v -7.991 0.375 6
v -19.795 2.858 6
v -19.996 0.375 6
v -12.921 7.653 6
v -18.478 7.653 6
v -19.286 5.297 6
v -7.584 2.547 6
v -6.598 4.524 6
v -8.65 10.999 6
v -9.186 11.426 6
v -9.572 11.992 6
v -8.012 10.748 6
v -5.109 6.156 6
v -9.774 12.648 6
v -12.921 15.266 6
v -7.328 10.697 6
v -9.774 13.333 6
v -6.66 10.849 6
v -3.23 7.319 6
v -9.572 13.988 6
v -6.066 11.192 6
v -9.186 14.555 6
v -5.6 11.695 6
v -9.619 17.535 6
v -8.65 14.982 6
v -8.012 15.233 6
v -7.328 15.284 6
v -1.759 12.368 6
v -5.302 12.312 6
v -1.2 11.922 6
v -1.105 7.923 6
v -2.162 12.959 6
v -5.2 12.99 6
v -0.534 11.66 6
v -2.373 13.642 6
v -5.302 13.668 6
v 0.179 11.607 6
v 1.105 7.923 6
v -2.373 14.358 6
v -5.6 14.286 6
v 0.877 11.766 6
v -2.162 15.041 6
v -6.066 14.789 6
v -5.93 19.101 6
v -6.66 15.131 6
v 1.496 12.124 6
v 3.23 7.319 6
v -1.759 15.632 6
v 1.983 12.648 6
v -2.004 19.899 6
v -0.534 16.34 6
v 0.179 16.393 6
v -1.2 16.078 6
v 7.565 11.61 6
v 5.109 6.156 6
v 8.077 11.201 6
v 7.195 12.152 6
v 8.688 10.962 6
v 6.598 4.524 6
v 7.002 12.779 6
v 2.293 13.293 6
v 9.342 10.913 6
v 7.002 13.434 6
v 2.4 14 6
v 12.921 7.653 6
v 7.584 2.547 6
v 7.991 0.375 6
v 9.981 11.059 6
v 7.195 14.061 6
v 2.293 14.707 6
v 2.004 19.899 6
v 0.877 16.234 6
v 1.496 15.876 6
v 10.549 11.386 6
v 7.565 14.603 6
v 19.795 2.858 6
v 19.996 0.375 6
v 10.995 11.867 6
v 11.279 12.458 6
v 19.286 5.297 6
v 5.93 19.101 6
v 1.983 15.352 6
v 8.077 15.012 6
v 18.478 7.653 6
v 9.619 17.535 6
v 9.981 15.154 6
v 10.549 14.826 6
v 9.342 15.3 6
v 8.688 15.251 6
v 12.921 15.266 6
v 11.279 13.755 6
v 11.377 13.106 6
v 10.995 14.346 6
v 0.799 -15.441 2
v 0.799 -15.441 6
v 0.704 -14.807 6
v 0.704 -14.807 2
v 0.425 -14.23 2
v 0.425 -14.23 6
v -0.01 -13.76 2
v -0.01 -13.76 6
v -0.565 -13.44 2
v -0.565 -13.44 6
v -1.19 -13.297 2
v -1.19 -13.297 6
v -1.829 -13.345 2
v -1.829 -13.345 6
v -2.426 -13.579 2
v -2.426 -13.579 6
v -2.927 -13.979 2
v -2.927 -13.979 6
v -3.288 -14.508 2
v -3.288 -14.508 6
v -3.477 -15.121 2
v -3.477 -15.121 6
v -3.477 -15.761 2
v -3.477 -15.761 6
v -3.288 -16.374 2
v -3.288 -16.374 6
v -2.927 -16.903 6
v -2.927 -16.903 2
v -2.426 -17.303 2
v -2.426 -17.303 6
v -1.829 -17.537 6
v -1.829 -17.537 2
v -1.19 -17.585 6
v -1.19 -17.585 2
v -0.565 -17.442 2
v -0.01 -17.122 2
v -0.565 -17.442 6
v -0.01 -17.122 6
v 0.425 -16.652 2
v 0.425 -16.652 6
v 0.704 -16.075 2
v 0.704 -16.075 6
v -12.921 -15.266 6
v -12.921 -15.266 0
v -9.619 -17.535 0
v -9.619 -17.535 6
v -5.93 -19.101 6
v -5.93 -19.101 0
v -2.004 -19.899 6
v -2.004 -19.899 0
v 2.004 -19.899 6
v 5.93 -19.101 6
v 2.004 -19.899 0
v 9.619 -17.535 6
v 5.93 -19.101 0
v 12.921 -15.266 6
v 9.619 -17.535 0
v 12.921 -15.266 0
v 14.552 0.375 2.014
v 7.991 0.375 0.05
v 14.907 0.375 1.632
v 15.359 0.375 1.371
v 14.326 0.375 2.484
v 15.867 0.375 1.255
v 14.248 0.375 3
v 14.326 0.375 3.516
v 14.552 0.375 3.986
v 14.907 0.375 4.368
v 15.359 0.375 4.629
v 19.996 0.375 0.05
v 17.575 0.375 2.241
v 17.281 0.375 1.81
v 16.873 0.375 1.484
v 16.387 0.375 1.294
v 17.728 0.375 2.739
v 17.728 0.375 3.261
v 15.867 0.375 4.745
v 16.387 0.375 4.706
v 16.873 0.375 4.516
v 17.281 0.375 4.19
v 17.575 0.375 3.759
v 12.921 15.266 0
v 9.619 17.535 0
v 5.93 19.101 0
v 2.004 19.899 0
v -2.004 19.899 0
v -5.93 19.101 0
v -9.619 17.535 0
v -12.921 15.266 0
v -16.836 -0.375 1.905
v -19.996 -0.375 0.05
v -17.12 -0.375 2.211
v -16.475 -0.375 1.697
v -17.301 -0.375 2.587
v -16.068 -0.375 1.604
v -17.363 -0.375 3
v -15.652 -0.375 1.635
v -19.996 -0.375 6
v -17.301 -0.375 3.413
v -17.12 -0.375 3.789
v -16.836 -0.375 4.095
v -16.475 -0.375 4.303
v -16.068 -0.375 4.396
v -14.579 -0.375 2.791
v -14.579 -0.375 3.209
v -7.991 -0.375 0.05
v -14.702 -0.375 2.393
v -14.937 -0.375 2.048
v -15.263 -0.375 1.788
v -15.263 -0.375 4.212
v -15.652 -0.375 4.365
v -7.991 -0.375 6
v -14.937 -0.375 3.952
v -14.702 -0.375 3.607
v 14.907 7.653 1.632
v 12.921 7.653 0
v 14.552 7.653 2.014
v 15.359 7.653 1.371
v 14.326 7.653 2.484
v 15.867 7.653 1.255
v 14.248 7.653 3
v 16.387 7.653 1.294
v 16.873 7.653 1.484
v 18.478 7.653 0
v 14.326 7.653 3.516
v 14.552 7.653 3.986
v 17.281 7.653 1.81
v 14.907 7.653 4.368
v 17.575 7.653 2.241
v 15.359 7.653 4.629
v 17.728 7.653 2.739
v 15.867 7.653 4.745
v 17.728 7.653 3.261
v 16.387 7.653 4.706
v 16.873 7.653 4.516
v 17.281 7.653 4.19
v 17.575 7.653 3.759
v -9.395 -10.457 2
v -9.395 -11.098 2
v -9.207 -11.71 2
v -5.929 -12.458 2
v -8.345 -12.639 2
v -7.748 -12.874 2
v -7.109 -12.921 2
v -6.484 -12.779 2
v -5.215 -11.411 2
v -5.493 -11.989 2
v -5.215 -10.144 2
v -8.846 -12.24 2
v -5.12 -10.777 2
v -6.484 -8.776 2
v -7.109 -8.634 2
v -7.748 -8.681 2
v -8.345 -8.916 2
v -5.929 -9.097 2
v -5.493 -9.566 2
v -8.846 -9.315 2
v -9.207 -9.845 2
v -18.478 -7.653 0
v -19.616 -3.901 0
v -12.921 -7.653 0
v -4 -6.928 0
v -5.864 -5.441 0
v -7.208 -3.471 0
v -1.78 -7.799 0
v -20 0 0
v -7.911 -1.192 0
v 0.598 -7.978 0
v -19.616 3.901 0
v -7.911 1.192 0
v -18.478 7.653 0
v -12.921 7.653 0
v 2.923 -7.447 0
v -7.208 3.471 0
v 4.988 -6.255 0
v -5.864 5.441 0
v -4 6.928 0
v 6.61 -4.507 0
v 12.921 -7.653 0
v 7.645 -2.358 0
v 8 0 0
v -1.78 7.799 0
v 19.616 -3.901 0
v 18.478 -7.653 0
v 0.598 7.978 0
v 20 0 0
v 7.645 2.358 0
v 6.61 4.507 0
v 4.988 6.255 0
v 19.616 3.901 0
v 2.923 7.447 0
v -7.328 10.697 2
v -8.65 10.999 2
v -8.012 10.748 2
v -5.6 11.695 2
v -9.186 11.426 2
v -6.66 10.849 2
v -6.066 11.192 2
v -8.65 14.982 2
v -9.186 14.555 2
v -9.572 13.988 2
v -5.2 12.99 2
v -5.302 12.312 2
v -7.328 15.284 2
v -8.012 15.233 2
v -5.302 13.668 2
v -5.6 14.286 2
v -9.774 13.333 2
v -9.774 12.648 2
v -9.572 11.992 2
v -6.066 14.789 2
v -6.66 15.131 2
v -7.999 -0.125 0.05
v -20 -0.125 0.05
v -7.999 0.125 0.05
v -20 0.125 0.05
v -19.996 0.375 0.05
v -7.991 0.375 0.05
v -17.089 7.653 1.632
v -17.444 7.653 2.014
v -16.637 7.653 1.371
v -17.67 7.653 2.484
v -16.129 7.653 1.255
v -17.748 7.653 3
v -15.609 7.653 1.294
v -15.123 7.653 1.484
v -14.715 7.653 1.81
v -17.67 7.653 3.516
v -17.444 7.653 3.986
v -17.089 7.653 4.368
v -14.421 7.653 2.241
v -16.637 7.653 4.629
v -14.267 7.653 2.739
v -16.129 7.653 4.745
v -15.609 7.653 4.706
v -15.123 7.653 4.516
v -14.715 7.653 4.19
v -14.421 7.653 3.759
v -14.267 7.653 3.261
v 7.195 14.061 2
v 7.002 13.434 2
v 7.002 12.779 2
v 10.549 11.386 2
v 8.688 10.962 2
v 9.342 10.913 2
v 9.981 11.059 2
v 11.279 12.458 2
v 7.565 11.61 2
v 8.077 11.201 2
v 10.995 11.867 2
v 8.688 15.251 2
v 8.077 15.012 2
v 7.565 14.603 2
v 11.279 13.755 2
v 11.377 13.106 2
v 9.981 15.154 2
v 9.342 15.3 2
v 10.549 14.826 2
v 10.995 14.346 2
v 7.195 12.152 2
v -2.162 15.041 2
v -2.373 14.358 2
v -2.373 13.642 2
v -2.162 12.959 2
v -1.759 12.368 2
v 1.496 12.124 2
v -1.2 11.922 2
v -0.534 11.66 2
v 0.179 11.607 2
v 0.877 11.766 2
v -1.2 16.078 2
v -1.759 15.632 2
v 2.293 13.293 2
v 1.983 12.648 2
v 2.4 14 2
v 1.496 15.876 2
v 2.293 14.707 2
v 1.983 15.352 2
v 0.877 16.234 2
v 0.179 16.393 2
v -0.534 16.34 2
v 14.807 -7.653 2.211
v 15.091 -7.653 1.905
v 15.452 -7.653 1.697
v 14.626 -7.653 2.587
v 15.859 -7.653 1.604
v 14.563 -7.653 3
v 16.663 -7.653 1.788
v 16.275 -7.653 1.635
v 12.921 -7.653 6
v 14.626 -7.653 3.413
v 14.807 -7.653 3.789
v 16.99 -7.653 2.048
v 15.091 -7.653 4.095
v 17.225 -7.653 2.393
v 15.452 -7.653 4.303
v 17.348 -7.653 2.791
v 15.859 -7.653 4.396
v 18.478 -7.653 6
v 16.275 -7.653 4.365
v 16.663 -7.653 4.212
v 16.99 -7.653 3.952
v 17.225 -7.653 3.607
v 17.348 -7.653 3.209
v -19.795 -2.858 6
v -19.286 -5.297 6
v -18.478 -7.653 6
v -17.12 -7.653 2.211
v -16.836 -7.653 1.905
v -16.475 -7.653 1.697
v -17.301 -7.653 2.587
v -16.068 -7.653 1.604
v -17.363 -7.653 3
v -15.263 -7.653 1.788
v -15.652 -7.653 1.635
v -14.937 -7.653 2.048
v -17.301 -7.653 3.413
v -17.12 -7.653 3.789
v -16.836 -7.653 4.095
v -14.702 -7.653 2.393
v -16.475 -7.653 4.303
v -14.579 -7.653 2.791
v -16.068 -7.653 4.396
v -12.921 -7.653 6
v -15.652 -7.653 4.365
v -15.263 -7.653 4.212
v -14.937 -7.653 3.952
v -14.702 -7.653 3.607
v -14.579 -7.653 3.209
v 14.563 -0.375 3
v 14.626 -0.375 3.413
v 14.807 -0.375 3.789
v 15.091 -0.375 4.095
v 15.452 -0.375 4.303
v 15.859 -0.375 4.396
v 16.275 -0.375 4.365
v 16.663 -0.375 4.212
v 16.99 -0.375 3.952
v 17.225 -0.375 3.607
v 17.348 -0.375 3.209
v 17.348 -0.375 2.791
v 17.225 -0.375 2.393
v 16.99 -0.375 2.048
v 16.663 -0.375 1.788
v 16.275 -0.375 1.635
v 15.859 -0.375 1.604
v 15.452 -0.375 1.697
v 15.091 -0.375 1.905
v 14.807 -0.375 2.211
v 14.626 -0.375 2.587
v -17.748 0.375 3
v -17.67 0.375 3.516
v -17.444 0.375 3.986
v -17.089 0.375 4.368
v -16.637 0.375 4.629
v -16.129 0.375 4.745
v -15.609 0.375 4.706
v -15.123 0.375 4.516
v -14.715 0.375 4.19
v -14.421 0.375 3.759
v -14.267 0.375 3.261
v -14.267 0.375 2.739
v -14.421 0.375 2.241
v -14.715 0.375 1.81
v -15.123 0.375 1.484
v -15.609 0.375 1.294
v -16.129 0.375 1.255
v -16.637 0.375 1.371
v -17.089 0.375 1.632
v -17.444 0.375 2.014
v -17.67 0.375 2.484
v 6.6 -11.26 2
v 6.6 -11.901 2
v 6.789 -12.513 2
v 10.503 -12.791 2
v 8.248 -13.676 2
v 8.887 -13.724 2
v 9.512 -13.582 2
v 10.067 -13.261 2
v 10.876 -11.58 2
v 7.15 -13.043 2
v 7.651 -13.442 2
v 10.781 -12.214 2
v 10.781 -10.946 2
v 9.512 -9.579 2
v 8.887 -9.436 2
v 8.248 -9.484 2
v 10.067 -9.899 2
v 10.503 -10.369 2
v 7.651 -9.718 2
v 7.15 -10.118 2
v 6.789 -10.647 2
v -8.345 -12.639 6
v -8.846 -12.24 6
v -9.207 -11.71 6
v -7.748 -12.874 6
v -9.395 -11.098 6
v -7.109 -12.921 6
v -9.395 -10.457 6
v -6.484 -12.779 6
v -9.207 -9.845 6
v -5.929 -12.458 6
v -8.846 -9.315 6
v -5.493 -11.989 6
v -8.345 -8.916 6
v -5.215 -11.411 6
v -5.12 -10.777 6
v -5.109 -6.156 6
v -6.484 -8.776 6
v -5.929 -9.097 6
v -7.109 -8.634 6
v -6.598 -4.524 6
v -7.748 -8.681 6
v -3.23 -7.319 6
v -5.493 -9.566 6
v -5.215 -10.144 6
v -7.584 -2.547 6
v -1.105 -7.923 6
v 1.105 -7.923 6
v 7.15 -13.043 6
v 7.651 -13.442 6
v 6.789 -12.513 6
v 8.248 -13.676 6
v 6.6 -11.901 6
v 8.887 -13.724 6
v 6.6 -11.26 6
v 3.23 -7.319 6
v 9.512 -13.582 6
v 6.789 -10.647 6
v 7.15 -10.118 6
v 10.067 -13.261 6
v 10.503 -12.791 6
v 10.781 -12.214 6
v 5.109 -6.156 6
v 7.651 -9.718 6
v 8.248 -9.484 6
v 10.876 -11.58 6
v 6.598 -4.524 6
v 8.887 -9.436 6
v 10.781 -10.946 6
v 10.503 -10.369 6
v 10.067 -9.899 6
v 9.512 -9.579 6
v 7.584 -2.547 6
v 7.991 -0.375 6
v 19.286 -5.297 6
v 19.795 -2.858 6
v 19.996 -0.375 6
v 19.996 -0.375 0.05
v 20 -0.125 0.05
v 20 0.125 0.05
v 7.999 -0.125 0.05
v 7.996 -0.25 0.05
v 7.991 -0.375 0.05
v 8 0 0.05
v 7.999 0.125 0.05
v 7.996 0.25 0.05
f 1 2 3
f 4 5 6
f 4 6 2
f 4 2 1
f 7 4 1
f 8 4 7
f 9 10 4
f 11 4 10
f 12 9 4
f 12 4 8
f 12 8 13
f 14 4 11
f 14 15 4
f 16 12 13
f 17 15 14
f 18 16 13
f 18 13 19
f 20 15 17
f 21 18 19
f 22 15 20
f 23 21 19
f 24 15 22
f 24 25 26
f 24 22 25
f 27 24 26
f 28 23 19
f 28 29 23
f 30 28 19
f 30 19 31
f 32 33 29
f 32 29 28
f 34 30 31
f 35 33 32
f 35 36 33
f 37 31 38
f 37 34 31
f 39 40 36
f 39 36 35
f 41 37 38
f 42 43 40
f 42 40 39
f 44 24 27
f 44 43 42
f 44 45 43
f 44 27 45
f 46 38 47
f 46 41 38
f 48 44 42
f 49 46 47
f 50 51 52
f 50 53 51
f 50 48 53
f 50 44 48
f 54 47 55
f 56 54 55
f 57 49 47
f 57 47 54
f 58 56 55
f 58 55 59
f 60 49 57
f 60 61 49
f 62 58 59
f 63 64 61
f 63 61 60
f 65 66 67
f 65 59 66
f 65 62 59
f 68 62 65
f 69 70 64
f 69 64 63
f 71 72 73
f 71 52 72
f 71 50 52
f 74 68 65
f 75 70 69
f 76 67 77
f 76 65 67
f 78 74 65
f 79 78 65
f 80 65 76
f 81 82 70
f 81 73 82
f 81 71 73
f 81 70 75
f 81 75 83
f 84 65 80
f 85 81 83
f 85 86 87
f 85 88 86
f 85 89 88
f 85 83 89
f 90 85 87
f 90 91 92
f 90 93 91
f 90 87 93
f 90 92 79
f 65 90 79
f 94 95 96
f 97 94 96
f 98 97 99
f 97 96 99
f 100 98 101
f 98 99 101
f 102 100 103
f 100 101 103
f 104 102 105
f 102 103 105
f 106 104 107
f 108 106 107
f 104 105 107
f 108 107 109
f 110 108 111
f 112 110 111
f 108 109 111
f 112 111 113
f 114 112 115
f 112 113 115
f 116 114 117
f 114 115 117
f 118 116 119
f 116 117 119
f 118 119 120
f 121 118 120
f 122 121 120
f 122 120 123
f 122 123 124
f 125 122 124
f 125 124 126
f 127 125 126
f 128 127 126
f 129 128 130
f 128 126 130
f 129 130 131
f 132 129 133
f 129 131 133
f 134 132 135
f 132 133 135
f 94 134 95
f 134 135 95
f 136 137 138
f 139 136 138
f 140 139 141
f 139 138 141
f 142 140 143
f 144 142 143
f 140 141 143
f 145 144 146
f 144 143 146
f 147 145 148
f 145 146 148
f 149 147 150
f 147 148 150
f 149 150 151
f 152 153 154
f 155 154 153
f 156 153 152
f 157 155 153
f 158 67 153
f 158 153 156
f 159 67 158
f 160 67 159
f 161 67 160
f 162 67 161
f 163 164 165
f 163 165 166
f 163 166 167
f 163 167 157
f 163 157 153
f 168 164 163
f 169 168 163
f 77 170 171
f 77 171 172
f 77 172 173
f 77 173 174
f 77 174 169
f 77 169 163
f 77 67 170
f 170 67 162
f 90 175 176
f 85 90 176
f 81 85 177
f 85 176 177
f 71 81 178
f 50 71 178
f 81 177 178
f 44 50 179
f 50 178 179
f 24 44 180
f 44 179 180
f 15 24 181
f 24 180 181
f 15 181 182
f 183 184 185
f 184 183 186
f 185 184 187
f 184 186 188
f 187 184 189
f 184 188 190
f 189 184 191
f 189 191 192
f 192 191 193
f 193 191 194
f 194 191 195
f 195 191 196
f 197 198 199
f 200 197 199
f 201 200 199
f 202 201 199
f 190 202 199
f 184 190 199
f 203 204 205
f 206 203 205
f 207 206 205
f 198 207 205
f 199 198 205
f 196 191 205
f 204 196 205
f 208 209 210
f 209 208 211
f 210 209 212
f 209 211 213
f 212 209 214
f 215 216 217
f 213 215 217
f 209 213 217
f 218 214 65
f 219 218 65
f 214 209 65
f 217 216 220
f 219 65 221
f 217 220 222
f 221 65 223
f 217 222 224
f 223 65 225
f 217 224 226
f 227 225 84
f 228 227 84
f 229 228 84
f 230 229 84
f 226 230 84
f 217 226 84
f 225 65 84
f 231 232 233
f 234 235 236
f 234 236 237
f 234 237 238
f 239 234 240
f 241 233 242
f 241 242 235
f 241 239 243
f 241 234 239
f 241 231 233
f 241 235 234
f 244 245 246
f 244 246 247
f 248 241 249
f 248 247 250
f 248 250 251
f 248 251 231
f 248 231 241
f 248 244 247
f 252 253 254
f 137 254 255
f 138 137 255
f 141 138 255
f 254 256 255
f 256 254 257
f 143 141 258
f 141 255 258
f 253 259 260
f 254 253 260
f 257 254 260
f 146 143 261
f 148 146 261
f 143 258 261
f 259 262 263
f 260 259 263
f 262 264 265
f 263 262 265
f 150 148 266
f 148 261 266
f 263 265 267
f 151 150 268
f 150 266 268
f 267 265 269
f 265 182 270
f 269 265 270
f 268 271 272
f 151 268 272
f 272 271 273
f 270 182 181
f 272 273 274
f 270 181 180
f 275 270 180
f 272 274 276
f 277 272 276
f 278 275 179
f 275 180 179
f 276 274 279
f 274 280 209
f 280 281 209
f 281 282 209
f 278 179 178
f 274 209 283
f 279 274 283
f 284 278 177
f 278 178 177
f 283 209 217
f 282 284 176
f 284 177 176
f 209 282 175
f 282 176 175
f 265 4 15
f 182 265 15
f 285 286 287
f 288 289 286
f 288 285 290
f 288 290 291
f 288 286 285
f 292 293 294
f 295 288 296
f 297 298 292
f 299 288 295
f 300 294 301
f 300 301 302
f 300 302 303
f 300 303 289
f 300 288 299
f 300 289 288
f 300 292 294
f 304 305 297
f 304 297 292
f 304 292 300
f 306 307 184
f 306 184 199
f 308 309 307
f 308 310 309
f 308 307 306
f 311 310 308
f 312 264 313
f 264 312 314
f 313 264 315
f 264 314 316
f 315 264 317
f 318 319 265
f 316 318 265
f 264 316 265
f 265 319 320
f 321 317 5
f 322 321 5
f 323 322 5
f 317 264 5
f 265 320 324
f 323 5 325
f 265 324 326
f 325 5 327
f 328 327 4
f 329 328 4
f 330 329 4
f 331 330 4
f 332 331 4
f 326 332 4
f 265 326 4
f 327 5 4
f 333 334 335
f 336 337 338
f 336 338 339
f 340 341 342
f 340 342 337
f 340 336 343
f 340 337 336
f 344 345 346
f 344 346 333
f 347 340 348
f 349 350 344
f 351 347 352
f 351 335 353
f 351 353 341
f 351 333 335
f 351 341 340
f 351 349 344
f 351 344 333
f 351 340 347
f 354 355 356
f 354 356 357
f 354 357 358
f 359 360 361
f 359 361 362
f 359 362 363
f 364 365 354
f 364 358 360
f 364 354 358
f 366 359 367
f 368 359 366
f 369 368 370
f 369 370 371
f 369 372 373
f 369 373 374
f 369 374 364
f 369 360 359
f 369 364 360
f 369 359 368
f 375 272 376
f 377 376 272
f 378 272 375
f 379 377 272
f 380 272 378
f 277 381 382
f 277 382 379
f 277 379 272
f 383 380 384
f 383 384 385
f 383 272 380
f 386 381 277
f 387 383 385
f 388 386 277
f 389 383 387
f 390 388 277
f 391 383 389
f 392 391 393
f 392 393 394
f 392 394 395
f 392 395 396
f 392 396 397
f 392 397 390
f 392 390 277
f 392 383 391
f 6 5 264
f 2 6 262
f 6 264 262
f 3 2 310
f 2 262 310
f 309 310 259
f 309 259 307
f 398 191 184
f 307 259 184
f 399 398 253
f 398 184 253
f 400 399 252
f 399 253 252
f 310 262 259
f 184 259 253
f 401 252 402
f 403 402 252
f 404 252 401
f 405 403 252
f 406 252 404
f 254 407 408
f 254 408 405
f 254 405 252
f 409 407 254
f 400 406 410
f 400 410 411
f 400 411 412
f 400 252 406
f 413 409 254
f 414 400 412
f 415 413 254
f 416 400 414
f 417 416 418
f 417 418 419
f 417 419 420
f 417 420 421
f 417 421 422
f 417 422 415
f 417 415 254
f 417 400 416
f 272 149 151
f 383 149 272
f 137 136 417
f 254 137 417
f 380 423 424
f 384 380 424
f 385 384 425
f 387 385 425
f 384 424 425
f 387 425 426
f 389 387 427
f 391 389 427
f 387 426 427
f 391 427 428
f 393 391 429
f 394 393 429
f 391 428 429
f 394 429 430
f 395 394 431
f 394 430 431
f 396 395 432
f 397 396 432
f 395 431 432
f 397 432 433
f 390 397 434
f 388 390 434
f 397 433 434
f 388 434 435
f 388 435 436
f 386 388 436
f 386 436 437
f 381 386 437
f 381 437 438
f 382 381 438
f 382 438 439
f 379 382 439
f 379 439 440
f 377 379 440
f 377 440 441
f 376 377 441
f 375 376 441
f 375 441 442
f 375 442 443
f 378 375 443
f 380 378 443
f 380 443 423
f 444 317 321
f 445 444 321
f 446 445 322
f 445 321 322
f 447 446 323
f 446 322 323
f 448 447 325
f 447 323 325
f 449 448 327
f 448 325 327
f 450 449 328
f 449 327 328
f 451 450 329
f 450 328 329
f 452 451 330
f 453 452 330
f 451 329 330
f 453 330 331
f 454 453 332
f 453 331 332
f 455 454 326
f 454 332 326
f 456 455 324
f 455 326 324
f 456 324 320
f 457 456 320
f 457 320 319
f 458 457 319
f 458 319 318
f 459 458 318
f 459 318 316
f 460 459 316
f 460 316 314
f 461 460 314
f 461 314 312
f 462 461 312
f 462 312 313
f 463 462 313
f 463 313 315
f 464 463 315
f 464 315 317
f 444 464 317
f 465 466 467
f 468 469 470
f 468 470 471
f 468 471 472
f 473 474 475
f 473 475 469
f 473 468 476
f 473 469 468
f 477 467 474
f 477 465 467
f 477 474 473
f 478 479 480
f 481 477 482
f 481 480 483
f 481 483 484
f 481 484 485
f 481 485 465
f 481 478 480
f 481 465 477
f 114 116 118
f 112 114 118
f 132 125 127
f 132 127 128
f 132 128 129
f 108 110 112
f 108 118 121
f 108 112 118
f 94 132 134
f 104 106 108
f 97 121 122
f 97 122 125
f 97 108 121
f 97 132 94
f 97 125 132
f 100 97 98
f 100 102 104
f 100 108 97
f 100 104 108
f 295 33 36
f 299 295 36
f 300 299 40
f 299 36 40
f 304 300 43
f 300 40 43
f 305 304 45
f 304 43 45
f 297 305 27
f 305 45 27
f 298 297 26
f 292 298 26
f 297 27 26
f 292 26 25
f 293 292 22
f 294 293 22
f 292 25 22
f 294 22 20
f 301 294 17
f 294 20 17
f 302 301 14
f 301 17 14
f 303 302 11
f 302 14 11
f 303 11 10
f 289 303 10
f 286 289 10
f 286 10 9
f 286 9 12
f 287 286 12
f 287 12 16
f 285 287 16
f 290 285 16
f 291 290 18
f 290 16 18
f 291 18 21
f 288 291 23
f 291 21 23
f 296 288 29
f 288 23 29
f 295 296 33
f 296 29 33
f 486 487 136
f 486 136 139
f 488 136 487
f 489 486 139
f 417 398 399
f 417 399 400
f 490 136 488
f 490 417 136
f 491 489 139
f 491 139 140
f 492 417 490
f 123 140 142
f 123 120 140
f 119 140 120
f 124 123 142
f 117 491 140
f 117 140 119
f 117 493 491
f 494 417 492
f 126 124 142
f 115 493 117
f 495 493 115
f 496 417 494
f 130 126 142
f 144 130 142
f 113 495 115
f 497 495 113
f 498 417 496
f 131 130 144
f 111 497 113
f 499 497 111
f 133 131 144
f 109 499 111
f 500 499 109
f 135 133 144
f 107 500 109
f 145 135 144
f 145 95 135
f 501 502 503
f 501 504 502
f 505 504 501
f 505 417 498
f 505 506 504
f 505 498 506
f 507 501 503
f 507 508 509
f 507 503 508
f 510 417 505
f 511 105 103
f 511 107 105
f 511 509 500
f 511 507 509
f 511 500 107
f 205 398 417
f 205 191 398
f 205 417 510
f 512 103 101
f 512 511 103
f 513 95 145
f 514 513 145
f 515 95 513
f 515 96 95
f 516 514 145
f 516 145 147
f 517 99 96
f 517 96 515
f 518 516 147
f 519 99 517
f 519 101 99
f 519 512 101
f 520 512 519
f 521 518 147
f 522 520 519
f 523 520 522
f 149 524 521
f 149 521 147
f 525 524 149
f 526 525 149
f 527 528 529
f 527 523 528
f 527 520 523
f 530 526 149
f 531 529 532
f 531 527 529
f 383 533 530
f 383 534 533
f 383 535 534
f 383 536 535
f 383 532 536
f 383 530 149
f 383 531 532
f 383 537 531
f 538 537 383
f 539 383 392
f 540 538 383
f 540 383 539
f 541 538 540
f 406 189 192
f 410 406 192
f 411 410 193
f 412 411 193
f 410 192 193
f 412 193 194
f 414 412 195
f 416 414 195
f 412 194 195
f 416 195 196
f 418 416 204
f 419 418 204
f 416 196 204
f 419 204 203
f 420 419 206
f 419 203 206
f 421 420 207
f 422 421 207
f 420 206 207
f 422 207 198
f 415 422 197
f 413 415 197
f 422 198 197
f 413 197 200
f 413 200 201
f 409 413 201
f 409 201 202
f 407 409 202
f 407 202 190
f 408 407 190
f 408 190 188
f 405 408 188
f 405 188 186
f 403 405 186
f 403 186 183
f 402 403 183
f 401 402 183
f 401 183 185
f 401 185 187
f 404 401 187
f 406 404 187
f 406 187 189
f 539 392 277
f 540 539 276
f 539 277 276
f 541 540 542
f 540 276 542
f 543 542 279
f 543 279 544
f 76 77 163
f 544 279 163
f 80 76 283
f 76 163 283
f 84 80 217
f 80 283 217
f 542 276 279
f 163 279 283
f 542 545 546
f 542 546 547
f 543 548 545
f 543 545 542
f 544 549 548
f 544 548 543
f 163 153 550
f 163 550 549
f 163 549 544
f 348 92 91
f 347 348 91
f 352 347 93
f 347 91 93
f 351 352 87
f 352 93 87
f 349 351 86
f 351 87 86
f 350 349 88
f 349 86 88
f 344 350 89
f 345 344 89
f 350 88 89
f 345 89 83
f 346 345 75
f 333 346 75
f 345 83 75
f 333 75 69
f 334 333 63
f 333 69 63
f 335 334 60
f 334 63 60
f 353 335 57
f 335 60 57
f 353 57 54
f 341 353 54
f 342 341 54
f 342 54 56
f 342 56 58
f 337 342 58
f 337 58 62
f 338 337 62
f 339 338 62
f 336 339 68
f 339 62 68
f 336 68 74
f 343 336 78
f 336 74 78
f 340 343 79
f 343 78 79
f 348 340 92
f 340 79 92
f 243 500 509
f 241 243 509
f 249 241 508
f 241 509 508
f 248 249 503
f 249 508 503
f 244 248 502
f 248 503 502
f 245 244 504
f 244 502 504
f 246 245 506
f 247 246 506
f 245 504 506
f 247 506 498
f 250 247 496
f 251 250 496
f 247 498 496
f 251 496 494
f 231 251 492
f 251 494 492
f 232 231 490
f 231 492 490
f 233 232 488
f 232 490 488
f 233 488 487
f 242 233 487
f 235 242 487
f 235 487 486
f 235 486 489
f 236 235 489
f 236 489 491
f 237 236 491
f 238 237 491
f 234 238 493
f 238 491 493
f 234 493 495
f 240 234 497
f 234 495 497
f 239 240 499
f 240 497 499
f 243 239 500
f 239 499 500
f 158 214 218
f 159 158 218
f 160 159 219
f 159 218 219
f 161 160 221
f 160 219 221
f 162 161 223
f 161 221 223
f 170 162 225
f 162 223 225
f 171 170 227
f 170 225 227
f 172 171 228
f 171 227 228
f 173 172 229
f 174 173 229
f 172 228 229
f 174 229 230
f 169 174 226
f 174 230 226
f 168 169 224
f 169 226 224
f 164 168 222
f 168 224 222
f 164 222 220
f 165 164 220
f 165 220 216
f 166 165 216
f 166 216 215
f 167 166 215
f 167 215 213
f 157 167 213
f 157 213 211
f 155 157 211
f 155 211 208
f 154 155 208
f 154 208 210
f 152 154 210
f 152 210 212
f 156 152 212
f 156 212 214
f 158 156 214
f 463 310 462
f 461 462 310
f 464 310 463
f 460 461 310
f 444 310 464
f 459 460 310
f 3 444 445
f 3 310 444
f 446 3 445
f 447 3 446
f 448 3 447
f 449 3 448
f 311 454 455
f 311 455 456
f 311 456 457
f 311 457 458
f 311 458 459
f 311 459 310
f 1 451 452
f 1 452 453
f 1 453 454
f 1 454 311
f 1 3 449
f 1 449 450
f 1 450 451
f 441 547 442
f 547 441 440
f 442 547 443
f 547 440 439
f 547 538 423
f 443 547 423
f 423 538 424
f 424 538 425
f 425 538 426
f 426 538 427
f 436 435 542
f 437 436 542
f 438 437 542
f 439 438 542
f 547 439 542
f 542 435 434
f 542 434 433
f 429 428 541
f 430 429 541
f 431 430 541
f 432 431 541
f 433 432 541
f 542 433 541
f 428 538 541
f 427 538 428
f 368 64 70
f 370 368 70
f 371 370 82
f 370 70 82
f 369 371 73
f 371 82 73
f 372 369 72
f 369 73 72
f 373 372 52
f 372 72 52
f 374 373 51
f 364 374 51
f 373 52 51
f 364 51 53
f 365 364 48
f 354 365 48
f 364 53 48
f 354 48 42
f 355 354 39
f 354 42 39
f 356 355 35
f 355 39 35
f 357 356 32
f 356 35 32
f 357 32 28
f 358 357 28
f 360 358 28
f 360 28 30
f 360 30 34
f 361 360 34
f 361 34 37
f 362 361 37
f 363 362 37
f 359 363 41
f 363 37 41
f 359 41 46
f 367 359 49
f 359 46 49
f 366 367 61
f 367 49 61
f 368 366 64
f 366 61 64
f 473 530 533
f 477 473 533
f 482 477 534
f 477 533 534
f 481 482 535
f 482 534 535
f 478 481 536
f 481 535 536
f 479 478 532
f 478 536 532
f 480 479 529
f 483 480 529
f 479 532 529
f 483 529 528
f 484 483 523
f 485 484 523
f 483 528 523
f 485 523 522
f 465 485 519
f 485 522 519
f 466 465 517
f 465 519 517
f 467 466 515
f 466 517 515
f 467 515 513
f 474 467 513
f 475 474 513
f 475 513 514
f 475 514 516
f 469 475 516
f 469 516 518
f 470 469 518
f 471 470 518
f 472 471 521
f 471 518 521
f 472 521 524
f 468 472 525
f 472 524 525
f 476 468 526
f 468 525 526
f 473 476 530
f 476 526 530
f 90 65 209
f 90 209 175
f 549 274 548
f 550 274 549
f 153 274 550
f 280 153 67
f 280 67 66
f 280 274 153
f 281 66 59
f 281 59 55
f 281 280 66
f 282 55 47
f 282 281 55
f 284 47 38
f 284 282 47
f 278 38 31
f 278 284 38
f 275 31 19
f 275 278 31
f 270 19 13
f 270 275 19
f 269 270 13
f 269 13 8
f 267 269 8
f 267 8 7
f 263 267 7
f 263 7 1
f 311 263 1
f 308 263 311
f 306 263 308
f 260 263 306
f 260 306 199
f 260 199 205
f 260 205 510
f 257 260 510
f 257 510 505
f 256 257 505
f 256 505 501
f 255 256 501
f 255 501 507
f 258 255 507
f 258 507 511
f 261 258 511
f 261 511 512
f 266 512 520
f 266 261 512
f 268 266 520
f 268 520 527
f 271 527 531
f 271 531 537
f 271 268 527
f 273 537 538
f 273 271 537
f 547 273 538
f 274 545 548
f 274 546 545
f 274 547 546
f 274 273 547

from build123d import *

# Parameters (mm, degrees)
SKETCH_R        = 20
SKETCH_R_2      = 8
PAD_DEPTH       = 6
SKETCH001_R     = 2.4
SKETCH001_R_2   = 2.3
SKETCH001_R_3   = 2.2
SKETCH001_R_4   = 2.15
POCKET_DEPTH    = 4
SKETCH003_W     = 43.022533
SKETCH003_H     = 0.75
POCKET001_DEPTH = 5.95
SKETCH007_W     = 7.6375744751
SKETCH007_H     = 10.86069433
SKETCH007_W_2   = 8.2446434751
SKETCH007_H_2   = 12.05515533
SKETCH007_W_3   = 8.5299164751
SKETCH007_H_3   = 10.94123533
SKETCH007_W_4   = 11.8328734751
SKETCH007_H_4   = 10.66832833
POCKET002_DEPTH = 6.001
SKETCH008_R     = 1.4
POCKET003_DEPTH = 27.65392667
SKETCH009_R     = 1.75
POCKET004_DEPTH = 8


with BuildPart() as part:
    # Sketch → Pad (new body)
    with BuildSketch(Plane.XY):
        Circle(SKETCH_R)
        Circle(SKETCH_R_2, mode=Mode.SUBTRACT)
    extrude(amount=PAD_DEPTH)

    # Sketch001 (on Face4 of Pad) → Pocket (cut)
    with BuildSketch(Plane.XY.offset(6)):
        with Locations((0, 14)):
            Circle(SKETCH001_R)
        with Locations((-7.5, 12.9903810568)):
            Circle(SKETCH001_R_2)
        with Locations((9.1772229816, 13.1064327086)):
            Circle(SKETCH001_R_3)
        with Locations((8.7263178357, -11.5802148957)):
            Circle(SKETCH001_R_4)
        with Locations((-1.3509140126, -15.4410178204)):
            Circle(SKETCH001_R_4)
        with Locations((-7.2695077451, -10.7774884432)):
            Circle(SKETCH001_R_4)
    extrude(amount=-POCKET_DEPTH, mode=Mode.SUBTRACT)

    # Sketch003 (on Face3 of Pocket) → Pocket001 (cut)
    with BuildSketch(Plane.XY.offset(6)):
        with Locations((-0.7364995, 0)):
            Rectangle(SKETCH003_W, SKETCH003_H)
    extrude(amount=-POCKET001_DEPTH, mode=Mode.SUBTRACT)

    # Sketch007 (on Face9 of Pocket001) → Pocket002 (cut, through all)
    with BuildSketch(Plane.XY.offset(6)):
        with Locations((-16.7398847624, -13.083273835)):
            Rectangle(SKETCH007_W, SKETCH007_H)
        with Locations((-17.0434192624, 13.680504335)):
            Rectangle(SKETCH007_W_2, SKETCH007_H_2)
        with Locations((17.1860557624, 13.123544335)):
            Rectangle(SKETCH007_W_3, SKETCH007_H_3)
        with Locations((18.8375342624, -12.987090835)):
            Rectangle(SKETCH007_W_4, SKETCH007_H_4)
    extrude(amount=-POCKET002_DEPTH, mode=Mode.SUBTRACT)

    # Sketch008 → Pocket003 (cut, through all)
    with BuildSketch(Plane(origin=(0, 7.65292667, 0), x_dir=(-1, 0, 0), z_dir=(0, 1, 0))):
        with Locations((-15.963433, 3)):
            Circle(SKETCH008_R)
        with Locations((15.963433, 3)):
            Circle(SKETCH008_R)
    extrude(amount=-POCKET003_DEPTH, mode=Mode.SUBTRACT)

    # Sketch009 → Pocket004 (cut)
    with BuildSketch(Plane(origin=(0, 7.65292667, 0), x_dir=(-1, 0, 0), z_dir=(0, 1, 0))):
        with Locations((-15.997951, 3)):
            Circle(SKETCH009_R)
        with Locations((15.997951, 3)):
            Circle(SKETCH009_R)
    extrude(amount=-POCKET004_DEPTH, mode=Mode.SUBTRACT)


solid = part.part
